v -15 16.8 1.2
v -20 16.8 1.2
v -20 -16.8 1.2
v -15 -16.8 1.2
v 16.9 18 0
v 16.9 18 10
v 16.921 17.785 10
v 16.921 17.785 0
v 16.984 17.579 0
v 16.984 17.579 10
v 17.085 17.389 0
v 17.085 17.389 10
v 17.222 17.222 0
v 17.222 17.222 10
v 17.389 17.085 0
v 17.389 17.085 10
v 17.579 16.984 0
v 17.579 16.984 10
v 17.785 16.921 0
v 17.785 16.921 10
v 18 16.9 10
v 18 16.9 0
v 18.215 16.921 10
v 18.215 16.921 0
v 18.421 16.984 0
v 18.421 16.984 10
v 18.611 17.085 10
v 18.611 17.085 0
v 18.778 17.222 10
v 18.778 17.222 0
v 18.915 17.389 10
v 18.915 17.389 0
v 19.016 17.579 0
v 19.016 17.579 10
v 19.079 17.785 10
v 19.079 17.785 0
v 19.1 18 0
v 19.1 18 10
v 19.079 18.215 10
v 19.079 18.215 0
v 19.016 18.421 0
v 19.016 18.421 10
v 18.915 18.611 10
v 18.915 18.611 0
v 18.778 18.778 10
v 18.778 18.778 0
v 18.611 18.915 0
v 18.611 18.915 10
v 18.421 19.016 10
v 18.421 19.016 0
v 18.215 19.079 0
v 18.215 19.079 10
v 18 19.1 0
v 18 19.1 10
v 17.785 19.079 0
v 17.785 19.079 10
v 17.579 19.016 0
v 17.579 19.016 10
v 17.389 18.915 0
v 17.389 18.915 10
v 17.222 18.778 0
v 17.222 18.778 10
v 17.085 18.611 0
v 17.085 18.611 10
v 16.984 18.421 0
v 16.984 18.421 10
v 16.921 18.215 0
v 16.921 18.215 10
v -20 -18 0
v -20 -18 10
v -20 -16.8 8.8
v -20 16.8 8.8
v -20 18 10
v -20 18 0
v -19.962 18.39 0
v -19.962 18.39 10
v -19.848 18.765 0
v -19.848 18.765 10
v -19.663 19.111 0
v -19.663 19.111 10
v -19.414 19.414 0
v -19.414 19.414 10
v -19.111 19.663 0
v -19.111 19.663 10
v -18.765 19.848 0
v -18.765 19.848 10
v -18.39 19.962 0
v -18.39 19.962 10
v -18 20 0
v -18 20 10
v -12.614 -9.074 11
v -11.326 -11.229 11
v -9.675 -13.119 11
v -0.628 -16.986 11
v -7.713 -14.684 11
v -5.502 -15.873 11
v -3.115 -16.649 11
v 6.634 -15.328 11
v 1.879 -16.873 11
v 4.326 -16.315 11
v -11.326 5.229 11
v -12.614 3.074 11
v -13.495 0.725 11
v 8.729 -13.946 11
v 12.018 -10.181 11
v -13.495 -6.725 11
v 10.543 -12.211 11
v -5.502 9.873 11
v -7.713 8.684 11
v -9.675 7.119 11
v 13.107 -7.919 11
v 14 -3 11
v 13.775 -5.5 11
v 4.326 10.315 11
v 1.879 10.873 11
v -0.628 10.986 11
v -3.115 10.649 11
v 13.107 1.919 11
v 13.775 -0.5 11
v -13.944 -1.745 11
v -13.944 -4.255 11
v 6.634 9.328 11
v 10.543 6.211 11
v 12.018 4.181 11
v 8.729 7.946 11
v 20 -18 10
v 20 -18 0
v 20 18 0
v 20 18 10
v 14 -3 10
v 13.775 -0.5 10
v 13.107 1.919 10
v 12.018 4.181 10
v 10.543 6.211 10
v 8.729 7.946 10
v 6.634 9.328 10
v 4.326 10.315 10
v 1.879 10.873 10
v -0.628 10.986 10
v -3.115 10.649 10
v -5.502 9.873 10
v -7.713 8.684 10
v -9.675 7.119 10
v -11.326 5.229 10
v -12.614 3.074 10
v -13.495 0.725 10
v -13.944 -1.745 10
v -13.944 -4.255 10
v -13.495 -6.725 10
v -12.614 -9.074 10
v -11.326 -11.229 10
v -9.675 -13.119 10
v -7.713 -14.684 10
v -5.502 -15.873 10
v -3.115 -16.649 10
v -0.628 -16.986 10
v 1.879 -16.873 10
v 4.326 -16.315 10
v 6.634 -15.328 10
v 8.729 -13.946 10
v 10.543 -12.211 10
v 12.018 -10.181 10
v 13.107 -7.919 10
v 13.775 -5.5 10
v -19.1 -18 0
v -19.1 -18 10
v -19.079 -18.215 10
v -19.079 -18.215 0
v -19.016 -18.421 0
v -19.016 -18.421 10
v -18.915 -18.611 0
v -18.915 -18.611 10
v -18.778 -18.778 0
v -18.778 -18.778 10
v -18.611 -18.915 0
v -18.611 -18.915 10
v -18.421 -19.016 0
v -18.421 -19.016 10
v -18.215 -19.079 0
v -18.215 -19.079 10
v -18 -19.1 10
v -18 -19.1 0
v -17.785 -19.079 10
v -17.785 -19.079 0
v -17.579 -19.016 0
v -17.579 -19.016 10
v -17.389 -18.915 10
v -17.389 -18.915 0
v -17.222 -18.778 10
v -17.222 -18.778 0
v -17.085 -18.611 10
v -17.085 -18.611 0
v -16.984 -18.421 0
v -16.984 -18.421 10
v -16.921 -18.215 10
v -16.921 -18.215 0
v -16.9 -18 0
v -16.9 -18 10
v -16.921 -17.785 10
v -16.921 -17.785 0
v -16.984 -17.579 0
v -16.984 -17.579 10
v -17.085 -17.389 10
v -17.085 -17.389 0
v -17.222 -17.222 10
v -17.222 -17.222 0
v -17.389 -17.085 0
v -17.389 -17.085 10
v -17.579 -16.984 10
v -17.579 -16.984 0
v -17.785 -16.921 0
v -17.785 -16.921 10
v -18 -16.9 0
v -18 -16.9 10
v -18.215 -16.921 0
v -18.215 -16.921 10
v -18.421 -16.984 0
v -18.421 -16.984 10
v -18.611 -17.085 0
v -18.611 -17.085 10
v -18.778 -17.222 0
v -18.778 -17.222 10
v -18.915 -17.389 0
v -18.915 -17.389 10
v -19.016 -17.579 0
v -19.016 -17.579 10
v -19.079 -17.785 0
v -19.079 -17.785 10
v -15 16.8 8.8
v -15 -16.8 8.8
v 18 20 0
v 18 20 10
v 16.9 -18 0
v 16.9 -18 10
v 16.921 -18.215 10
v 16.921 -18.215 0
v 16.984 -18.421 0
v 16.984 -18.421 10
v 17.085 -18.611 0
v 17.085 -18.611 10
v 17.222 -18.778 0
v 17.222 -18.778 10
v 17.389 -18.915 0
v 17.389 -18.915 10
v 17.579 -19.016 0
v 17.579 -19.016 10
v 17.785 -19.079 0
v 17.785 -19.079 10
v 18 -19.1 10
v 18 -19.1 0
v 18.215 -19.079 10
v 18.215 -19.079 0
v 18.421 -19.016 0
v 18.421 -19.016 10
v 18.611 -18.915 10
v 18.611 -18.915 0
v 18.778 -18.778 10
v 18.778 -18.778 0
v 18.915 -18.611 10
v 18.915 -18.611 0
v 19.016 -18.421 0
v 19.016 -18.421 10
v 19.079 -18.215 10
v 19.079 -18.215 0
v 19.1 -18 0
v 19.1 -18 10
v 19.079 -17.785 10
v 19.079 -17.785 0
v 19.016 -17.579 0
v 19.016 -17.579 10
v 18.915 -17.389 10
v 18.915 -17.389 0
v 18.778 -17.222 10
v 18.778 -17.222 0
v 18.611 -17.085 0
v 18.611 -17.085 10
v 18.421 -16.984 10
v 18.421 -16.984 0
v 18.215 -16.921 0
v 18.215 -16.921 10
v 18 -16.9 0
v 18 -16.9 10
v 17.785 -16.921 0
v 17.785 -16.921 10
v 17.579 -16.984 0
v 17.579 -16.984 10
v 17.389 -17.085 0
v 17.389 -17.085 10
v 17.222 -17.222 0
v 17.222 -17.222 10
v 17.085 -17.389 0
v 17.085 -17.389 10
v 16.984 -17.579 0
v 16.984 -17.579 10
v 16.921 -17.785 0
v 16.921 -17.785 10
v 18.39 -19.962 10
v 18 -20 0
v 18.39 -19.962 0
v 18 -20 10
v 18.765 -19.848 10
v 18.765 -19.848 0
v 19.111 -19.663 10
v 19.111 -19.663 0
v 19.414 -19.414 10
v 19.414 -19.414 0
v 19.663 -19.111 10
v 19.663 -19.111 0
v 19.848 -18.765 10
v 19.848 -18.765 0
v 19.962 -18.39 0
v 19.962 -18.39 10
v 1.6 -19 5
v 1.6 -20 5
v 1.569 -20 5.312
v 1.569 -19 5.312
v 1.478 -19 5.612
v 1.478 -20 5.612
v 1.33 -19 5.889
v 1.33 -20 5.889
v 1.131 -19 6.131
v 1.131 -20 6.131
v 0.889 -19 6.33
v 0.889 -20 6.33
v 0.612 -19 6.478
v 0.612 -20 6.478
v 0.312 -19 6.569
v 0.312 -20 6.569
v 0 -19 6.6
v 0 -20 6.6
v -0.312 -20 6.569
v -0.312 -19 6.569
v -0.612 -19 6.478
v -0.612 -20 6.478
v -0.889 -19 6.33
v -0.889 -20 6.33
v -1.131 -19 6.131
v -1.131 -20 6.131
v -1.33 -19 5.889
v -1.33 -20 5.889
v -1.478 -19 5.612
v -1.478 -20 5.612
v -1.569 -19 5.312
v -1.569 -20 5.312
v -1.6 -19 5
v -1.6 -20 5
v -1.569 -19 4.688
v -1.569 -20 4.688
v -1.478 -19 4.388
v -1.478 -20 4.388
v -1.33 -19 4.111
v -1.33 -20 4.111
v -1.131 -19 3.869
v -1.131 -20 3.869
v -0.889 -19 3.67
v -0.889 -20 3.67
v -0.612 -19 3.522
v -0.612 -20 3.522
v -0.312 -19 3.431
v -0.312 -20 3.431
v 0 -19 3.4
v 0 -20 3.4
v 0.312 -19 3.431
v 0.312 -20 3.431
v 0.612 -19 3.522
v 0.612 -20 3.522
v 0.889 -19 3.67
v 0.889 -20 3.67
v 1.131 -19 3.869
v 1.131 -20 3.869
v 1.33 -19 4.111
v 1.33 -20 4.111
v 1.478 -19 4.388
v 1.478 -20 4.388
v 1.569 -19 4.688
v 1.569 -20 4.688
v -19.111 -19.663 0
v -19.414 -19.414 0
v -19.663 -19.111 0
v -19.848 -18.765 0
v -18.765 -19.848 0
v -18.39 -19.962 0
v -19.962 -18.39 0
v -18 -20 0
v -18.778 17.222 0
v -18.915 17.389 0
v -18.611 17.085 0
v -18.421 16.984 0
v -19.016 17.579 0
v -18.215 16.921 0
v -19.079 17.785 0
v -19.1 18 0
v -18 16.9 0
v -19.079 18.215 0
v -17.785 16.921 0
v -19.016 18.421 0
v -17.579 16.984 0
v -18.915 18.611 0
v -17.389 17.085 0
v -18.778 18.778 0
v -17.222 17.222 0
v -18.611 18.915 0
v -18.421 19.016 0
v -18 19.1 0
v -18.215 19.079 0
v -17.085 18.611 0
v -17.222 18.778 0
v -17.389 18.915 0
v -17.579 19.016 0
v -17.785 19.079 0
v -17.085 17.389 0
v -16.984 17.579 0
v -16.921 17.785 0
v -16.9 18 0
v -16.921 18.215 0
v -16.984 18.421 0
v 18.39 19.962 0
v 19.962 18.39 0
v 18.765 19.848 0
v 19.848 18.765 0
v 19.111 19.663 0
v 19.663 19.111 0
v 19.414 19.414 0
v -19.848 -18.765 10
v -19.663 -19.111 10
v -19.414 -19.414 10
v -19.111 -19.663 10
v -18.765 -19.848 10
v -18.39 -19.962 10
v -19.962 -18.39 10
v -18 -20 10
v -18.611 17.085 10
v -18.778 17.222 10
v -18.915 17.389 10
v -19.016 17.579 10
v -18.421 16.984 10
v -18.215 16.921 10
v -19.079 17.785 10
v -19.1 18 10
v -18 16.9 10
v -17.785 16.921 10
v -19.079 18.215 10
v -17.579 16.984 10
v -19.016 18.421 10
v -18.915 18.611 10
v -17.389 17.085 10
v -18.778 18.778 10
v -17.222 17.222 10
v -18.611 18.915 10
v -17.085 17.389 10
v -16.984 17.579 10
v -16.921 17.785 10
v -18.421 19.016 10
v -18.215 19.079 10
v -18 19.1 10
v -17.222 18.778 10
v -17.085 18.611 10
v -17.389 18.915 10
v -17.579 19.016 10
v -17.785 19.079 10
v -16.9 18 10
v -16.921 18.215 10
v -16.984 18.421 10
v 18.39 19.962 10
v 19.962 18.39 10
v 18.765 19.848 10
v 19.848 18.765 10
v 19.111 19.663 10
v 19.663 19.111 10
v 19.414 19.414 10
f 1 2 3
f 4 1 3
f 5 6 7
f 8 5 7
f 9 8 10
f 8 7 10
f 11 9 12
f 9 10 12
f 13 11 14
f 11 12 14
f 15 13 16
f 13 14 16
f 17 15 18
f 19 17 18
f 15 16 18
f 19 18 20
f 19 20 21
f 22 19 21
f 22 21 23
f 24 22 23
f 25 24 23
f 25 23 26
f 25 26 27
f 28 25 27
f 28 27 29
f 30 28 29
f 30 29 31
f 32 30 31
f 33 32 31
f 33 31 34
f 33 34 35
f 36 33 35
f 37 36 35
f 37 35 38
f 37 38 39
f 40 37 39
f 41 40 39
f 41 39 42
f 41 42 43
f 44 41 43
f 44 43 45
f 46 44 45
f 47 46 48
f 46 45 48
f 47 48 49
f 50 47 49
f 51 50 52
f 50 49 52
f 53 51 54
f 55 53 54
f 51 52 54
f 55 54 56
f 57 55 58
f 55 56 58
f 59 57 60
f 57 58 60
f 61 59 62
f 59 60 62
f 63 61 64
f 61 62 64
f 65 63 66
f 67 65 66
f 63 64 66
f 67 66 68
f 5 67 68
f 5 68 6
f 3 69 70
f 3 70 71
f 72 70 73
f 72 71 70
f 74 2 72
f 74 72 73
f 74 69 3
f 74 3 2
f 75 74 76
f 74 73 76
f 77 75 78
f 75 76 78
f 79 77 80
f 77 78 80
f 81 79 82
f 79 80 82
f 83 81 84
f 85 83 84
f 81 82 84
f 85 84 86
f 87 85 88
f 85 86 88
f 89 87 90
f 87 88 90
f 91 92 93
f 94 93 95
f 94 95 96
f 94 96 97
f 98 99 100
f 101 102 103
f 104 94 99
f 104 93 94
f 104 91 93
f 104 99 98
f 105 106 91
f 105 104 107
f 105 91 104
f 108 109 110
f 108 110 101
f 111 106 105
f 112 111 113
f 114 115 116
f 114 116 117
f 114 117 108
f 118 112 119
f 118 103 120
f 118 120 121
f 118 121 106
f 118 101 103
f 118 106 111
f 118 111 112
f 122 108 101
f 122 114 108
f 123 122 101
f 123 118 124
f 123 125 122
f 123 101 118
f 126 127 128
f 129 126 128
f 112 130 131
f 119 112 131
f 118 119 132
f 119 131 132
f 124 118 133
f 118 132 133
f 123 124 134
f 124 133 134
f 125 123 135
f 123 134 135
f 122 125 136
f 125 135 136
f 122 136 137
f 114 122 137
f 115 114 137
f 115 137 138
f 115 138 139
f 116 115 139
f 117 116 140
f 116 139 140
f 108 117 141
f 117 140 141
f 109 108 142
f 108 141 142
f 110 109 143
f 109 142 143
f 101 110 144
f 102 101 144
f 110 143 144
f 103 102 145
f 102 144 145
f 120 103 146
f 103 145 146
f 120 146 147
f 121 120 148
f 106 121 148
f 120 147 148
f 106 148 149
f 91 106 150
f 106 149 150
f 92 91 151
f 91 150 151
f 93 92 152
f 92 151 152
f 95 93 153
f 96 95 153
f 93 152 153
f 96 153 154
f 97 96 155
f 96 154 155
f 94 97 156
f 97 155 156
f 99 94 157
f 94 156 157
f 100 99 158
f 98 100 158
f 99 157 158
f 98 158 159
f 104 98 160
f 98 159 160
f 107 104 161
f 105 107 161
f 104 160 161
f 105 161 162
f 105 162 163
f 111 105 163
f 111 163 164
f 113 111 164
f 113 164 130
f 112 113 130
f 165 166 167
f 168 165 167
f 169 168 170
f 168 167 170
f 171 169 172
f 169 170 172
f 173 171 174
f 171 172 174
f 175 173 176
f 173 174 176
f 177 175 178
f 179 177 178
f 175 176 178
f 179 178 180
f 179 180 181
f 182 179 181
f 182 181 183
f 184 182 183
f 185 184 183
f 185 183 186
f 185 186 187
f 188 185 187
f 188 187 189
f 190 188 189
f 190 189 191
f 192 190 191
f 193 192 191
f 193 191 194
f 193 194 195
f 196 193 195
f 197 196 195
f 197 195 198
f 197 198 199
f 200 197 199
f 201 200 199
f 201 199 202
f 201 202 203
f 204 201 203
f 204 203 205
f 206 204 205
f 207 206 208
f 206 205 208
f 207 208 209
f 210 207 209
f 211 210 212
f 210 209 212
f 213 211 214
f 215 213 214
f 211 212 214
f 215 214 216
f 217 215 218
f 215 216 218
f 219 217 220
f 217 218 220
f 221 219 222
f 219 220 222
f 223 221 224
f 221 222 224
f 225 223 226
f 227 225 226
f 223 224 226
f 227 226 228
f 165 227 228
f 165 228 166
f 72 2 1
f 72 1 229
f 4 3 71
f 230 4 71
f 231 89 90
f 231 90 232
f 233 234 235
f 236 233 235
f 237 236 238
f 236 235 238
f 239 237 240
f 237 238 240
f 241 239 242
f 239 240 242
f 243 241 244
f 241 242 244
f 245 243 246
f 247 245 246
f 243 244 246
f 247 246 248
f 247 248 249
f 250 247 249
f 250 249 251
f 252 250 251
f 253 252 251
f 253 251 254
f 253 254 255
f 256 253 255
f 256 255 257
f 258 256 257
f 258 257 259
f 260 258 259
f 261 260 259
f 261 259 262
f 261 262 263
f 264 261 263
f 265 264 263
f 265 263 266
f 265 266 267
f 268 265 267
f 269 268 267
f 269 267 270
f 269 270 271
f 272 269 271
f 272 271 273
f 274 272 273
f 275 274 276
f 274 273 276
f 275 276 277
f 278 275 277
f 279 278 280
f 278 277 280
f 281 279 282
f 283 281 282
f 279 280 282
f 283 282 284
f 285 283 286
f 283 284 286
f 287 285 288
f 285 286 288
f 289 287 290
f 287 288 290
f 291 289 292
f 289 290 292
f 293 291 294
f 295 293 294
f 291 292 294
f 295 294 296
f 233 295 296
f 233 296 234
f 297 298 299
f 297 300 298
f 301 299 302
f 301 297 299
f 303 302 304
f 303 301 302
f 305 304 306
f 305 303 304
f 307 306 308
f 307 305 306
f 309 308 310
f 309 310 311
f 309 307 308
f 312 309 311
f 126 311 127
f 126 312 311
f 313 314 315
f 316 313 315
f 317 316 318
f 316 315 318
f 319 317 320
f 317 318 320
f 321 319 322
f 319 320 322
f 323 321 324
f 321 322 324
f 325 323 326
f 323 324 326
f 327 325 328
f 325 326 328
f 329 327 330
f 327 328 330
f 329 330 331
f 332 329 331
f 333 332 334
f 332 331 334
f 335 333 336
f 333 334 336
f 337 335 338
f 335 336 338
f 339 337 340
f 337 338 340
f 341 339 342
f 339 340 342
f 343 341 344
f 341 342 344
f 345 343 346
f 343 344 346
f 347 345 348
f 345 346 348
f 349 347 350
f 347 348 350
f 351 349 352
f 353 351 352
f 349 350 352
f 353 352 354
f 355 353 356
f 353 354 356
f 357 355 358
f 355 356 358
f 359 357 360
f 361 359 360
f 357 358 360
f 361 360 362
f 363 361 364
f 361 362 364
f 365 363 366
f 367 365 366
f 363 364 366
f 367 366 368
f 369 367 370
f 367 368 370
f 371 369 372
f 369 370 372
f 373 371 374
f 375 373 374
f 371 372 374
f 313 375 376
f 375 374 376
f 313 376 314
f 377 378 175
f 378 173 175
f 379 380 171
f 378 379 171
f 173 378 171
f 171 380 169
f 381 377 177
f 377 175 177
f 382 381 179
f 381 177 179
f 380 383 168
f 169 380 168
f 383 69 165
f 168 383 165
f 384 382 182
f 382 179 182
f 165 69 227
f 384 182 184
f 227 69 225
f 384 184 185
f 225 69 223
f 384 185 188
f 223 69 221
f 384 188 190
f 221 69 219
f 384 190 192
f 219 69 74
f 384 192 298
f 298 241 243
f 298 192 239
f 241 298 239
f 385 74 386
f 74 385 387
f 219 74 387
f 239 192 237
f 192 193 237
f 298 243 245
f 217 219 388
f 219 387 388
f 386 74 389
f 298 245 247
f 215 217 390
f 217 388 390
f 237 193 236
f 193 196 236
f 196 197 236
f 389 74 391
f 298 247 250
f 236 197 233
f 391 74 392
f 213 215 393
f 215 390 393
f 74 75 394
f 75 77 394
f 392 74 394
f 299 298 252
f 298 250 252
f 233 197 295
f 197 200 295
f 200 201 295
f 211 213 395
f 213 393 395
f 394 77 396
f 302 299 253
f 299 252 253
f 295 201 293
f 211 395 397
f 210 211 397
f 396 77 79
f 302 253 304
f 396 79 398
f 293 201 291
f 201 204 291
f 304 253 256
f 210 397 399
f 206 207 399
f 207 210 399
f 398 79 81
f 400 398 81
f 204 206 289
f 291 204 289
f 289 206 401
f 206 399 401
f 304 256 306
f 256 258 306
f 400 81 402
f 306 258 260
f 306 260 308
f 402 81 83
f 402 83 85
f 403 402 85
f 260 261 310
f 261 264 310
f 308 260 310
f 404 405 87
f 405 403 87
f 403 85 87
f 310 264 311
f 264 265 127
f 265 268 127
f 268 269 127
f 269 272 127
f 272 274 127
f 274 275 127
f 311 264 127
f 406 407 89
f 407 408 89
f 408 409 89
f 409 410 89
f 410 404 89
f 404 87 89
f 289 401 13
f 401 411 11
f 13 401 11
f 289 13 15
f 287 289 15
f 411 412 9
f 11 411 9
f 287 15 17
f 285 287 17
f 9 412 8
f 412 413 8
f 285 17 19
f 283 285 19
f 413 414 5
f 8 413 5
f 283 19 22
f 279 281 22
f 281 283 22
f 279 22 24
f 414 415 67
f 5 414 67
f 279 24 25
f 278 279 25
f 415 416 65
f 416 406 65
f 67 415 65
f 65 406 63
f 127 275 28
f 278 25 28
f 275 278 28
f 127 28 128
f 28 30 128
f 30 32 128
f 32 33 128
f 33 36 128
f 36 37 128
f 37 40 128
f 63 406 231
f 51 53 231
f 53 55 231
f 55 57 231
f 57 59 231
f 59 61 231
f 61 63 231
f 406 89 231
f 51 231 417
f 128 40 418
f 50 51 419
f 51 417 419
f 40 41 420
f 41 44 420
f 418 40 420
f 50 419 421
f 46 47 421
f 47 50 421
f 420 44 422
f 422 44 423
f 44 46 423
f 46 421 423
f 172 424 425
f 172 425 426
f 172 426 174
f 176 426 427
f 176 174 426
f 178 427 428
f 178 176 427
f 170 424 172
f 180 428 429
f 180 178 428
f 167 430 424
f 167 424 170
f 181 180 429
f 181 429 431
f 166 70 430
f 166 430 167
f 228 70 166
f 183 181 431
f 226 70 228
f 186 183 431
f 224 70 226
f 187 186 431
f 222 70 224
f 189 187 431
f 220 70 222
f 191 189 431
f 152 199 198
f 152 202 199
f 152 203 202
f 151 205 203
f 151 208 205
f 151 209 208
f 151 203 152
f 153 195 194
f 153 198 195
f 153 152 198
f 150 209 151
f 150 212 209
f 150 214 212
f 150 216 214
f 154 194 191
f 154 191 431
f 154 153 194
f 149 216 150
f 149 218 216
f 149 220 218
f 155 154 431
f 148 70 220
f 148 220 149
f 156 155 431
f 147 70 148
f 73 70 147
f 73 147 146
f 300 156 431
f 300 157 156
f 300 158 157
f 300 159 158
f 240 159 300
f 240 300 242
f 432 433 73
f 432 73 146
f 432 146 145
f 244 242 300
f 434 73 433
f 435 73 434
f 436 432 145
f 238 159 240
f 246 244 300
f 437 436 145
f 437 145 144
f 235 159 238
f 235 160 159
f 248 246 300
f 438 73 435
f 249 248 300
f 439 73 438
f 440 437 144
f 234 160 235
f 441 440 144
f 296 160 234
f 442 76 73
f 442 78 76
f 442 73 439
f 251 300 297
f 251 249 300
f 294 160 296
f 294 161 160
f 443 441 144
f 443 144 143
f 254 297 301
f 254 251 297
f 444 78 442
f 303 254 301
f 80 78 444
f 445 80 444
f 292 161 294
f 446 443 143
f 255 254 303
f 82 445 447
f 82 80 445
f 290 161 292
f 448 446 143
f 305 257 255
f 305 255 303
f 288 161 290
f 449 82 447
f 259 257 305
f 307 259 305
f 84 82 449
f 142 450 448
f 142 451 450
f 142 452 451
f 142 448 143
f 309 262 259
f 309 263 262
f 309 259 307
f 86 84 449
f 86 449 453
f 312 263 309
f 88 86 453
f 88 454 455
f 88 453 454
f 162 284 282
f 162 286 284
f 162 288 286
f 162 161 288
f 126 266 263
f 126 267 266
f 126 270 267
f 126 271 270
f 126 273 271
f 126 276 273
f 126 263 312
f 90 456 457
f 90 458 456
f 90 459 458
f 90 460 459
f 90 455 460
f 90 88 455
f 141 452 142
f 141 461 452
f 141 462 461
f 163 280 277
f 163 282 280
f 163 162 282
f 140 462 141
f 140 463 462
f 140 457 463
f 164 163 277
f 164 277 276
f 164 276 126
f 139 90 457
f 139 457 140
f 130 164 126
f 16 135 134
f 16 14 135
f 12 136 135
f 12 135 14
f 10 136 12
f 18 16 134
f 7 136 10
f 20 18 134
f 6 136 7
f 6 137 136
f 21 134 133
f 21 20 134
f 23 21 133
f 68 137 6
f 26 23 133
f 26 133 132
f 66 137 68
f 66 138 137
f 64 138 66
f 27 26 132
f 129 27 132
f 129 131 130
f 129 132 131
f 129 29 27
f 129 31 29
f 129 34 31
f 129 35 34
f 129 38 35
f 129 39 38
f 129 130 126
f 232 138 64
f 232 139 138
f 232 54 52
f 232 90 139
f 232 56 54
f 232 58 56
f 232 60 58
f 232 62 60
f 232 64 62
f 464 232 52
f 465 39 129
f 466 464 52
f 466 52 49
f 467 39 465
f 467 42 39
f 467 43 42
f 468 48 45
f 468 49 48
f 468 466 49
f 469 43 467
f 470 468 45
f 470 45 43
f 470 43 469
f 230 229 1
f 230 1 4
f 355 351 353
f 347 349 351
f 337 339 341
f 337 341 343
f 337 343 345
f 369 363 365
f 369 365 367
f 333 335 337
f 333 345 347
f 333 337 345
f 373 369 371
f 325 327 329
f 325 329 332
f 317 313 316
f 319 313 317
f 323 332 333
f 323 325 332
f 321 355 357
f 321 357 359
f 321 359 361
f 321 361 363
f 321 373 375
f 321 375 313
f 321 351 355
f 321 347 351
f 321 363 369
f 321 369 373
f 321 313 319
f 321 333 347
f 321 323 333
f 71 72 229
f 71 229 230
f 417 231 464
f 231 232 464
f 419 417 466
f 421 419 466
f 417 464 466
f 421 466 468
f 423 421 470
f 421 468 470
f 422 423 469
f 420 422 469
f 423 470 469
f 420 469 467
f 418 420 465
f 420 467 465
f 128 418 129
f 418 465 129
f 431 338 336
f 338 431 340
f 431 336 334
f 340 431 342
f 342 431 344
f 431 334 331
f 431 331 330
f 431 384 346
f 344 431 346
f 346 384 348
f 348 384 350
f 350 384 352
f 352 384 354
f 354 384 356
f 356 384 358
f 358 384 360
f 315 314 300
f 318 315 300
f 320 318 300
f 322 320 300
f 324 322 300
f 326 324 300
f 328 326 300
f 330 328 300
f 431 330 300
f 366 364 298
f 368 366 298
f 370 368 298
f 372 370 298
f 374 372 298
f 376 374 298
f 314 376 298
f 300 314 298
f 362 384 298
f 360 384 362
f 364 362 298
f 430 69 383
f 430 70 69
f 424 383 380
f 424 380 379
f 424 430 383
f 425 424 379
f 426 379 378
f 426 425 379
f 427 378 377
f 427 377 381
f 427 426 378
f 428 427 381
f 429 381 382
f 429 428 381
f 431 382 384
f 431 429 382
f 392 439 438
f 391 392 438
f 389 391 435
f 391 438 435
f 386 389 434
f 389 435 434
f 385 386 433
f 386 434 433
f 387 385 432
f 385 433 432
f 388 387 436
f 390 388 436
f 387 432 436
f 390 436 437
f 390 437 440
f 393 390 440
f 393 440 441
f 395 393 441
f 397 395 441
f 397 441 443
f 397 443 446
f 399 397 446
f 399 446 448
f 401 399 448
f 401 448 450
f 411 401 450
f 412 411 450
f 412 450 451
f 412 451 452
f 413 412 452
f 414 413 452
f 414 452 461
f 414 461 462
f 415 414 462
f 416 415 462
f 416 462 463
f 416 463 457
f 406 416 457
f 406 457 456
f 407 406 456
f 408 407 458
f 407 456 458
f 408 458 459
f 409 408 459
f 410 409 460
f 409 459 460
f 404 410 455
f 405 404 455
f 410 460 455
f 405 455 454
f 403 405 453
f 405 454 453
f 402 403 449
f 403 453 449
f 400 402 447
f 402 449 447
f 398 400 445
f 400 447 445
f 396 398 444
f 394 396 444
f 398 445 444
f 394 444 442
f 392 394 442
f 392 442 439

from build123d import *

# Parameters (mm, degrees)
F0_W     = 40
F0_H     = 40
F1_DEPTH = 10
F2_D     = 2.2
F2_DEPTH = 40
F3_R     = 2
F4_R     = 14
F5_DEPTH = 1
F6_W     = 33.6
F6_H     = 7.6
F7_DEPTH = 5
F8_R     = 1.6
F9_DEPTH = 1


with BuildPart() as f1:
    # F0 (on Top) → F1 (new body)
    with BuildSketch(Plane.XY):
        Rectangle(F0_W, F0_H)
    extrude(amount=F1_DEPTH)

    # F2
    with Locations(Plane(origin=(0, 0, 0), x_dir=(1, 0, 0), z_dir=(0, 0, -1))):
        with Locations((-18, -18), (-18, 18), (18, 18), (18, -18)):
            Hole(F2_D / 2, depth=F2_DEPTH)

    # F3
    f3_edges = [f1.edges().sort_by_distance(p)[0] for p in [
        (-20, -20, 5),
        (-20, 20, 5),
        (20, -20, 5),
        (20, 20, 5),
    ]]
    fillet(f3_edges, radius=F3_R)

    # F4 (on face) → F5 (join)
    with BuildSketch(Plane.XY.offset(10)):
        with Locations((0, -3)):
            Circle(F4_R)
    extrude(amount=F5_DEPTH)

    # F6 (on face) → F7 (cut)
    with BuildSketch(Plane(origin=(-20, 0, 0), x_dir=(0, -1, 0), z_dir=(-1, 0, 0))):
        with Locations((0, 5)):
            Rectangle(F6_W, F6_H)
    extrude(amount=-F7_DEPTH, mode=Mode.SUBTRACT)

    # F8 (on face) → F9 (cut)
    with BuildSketch(Plane.XZ.offset(20)):
        with Locations((0, 5)):
            Circle(F8_R)
    extrude(amount=-F9_DEPTH, mode=Mode.SUBTRACT)


solid = f1.part
